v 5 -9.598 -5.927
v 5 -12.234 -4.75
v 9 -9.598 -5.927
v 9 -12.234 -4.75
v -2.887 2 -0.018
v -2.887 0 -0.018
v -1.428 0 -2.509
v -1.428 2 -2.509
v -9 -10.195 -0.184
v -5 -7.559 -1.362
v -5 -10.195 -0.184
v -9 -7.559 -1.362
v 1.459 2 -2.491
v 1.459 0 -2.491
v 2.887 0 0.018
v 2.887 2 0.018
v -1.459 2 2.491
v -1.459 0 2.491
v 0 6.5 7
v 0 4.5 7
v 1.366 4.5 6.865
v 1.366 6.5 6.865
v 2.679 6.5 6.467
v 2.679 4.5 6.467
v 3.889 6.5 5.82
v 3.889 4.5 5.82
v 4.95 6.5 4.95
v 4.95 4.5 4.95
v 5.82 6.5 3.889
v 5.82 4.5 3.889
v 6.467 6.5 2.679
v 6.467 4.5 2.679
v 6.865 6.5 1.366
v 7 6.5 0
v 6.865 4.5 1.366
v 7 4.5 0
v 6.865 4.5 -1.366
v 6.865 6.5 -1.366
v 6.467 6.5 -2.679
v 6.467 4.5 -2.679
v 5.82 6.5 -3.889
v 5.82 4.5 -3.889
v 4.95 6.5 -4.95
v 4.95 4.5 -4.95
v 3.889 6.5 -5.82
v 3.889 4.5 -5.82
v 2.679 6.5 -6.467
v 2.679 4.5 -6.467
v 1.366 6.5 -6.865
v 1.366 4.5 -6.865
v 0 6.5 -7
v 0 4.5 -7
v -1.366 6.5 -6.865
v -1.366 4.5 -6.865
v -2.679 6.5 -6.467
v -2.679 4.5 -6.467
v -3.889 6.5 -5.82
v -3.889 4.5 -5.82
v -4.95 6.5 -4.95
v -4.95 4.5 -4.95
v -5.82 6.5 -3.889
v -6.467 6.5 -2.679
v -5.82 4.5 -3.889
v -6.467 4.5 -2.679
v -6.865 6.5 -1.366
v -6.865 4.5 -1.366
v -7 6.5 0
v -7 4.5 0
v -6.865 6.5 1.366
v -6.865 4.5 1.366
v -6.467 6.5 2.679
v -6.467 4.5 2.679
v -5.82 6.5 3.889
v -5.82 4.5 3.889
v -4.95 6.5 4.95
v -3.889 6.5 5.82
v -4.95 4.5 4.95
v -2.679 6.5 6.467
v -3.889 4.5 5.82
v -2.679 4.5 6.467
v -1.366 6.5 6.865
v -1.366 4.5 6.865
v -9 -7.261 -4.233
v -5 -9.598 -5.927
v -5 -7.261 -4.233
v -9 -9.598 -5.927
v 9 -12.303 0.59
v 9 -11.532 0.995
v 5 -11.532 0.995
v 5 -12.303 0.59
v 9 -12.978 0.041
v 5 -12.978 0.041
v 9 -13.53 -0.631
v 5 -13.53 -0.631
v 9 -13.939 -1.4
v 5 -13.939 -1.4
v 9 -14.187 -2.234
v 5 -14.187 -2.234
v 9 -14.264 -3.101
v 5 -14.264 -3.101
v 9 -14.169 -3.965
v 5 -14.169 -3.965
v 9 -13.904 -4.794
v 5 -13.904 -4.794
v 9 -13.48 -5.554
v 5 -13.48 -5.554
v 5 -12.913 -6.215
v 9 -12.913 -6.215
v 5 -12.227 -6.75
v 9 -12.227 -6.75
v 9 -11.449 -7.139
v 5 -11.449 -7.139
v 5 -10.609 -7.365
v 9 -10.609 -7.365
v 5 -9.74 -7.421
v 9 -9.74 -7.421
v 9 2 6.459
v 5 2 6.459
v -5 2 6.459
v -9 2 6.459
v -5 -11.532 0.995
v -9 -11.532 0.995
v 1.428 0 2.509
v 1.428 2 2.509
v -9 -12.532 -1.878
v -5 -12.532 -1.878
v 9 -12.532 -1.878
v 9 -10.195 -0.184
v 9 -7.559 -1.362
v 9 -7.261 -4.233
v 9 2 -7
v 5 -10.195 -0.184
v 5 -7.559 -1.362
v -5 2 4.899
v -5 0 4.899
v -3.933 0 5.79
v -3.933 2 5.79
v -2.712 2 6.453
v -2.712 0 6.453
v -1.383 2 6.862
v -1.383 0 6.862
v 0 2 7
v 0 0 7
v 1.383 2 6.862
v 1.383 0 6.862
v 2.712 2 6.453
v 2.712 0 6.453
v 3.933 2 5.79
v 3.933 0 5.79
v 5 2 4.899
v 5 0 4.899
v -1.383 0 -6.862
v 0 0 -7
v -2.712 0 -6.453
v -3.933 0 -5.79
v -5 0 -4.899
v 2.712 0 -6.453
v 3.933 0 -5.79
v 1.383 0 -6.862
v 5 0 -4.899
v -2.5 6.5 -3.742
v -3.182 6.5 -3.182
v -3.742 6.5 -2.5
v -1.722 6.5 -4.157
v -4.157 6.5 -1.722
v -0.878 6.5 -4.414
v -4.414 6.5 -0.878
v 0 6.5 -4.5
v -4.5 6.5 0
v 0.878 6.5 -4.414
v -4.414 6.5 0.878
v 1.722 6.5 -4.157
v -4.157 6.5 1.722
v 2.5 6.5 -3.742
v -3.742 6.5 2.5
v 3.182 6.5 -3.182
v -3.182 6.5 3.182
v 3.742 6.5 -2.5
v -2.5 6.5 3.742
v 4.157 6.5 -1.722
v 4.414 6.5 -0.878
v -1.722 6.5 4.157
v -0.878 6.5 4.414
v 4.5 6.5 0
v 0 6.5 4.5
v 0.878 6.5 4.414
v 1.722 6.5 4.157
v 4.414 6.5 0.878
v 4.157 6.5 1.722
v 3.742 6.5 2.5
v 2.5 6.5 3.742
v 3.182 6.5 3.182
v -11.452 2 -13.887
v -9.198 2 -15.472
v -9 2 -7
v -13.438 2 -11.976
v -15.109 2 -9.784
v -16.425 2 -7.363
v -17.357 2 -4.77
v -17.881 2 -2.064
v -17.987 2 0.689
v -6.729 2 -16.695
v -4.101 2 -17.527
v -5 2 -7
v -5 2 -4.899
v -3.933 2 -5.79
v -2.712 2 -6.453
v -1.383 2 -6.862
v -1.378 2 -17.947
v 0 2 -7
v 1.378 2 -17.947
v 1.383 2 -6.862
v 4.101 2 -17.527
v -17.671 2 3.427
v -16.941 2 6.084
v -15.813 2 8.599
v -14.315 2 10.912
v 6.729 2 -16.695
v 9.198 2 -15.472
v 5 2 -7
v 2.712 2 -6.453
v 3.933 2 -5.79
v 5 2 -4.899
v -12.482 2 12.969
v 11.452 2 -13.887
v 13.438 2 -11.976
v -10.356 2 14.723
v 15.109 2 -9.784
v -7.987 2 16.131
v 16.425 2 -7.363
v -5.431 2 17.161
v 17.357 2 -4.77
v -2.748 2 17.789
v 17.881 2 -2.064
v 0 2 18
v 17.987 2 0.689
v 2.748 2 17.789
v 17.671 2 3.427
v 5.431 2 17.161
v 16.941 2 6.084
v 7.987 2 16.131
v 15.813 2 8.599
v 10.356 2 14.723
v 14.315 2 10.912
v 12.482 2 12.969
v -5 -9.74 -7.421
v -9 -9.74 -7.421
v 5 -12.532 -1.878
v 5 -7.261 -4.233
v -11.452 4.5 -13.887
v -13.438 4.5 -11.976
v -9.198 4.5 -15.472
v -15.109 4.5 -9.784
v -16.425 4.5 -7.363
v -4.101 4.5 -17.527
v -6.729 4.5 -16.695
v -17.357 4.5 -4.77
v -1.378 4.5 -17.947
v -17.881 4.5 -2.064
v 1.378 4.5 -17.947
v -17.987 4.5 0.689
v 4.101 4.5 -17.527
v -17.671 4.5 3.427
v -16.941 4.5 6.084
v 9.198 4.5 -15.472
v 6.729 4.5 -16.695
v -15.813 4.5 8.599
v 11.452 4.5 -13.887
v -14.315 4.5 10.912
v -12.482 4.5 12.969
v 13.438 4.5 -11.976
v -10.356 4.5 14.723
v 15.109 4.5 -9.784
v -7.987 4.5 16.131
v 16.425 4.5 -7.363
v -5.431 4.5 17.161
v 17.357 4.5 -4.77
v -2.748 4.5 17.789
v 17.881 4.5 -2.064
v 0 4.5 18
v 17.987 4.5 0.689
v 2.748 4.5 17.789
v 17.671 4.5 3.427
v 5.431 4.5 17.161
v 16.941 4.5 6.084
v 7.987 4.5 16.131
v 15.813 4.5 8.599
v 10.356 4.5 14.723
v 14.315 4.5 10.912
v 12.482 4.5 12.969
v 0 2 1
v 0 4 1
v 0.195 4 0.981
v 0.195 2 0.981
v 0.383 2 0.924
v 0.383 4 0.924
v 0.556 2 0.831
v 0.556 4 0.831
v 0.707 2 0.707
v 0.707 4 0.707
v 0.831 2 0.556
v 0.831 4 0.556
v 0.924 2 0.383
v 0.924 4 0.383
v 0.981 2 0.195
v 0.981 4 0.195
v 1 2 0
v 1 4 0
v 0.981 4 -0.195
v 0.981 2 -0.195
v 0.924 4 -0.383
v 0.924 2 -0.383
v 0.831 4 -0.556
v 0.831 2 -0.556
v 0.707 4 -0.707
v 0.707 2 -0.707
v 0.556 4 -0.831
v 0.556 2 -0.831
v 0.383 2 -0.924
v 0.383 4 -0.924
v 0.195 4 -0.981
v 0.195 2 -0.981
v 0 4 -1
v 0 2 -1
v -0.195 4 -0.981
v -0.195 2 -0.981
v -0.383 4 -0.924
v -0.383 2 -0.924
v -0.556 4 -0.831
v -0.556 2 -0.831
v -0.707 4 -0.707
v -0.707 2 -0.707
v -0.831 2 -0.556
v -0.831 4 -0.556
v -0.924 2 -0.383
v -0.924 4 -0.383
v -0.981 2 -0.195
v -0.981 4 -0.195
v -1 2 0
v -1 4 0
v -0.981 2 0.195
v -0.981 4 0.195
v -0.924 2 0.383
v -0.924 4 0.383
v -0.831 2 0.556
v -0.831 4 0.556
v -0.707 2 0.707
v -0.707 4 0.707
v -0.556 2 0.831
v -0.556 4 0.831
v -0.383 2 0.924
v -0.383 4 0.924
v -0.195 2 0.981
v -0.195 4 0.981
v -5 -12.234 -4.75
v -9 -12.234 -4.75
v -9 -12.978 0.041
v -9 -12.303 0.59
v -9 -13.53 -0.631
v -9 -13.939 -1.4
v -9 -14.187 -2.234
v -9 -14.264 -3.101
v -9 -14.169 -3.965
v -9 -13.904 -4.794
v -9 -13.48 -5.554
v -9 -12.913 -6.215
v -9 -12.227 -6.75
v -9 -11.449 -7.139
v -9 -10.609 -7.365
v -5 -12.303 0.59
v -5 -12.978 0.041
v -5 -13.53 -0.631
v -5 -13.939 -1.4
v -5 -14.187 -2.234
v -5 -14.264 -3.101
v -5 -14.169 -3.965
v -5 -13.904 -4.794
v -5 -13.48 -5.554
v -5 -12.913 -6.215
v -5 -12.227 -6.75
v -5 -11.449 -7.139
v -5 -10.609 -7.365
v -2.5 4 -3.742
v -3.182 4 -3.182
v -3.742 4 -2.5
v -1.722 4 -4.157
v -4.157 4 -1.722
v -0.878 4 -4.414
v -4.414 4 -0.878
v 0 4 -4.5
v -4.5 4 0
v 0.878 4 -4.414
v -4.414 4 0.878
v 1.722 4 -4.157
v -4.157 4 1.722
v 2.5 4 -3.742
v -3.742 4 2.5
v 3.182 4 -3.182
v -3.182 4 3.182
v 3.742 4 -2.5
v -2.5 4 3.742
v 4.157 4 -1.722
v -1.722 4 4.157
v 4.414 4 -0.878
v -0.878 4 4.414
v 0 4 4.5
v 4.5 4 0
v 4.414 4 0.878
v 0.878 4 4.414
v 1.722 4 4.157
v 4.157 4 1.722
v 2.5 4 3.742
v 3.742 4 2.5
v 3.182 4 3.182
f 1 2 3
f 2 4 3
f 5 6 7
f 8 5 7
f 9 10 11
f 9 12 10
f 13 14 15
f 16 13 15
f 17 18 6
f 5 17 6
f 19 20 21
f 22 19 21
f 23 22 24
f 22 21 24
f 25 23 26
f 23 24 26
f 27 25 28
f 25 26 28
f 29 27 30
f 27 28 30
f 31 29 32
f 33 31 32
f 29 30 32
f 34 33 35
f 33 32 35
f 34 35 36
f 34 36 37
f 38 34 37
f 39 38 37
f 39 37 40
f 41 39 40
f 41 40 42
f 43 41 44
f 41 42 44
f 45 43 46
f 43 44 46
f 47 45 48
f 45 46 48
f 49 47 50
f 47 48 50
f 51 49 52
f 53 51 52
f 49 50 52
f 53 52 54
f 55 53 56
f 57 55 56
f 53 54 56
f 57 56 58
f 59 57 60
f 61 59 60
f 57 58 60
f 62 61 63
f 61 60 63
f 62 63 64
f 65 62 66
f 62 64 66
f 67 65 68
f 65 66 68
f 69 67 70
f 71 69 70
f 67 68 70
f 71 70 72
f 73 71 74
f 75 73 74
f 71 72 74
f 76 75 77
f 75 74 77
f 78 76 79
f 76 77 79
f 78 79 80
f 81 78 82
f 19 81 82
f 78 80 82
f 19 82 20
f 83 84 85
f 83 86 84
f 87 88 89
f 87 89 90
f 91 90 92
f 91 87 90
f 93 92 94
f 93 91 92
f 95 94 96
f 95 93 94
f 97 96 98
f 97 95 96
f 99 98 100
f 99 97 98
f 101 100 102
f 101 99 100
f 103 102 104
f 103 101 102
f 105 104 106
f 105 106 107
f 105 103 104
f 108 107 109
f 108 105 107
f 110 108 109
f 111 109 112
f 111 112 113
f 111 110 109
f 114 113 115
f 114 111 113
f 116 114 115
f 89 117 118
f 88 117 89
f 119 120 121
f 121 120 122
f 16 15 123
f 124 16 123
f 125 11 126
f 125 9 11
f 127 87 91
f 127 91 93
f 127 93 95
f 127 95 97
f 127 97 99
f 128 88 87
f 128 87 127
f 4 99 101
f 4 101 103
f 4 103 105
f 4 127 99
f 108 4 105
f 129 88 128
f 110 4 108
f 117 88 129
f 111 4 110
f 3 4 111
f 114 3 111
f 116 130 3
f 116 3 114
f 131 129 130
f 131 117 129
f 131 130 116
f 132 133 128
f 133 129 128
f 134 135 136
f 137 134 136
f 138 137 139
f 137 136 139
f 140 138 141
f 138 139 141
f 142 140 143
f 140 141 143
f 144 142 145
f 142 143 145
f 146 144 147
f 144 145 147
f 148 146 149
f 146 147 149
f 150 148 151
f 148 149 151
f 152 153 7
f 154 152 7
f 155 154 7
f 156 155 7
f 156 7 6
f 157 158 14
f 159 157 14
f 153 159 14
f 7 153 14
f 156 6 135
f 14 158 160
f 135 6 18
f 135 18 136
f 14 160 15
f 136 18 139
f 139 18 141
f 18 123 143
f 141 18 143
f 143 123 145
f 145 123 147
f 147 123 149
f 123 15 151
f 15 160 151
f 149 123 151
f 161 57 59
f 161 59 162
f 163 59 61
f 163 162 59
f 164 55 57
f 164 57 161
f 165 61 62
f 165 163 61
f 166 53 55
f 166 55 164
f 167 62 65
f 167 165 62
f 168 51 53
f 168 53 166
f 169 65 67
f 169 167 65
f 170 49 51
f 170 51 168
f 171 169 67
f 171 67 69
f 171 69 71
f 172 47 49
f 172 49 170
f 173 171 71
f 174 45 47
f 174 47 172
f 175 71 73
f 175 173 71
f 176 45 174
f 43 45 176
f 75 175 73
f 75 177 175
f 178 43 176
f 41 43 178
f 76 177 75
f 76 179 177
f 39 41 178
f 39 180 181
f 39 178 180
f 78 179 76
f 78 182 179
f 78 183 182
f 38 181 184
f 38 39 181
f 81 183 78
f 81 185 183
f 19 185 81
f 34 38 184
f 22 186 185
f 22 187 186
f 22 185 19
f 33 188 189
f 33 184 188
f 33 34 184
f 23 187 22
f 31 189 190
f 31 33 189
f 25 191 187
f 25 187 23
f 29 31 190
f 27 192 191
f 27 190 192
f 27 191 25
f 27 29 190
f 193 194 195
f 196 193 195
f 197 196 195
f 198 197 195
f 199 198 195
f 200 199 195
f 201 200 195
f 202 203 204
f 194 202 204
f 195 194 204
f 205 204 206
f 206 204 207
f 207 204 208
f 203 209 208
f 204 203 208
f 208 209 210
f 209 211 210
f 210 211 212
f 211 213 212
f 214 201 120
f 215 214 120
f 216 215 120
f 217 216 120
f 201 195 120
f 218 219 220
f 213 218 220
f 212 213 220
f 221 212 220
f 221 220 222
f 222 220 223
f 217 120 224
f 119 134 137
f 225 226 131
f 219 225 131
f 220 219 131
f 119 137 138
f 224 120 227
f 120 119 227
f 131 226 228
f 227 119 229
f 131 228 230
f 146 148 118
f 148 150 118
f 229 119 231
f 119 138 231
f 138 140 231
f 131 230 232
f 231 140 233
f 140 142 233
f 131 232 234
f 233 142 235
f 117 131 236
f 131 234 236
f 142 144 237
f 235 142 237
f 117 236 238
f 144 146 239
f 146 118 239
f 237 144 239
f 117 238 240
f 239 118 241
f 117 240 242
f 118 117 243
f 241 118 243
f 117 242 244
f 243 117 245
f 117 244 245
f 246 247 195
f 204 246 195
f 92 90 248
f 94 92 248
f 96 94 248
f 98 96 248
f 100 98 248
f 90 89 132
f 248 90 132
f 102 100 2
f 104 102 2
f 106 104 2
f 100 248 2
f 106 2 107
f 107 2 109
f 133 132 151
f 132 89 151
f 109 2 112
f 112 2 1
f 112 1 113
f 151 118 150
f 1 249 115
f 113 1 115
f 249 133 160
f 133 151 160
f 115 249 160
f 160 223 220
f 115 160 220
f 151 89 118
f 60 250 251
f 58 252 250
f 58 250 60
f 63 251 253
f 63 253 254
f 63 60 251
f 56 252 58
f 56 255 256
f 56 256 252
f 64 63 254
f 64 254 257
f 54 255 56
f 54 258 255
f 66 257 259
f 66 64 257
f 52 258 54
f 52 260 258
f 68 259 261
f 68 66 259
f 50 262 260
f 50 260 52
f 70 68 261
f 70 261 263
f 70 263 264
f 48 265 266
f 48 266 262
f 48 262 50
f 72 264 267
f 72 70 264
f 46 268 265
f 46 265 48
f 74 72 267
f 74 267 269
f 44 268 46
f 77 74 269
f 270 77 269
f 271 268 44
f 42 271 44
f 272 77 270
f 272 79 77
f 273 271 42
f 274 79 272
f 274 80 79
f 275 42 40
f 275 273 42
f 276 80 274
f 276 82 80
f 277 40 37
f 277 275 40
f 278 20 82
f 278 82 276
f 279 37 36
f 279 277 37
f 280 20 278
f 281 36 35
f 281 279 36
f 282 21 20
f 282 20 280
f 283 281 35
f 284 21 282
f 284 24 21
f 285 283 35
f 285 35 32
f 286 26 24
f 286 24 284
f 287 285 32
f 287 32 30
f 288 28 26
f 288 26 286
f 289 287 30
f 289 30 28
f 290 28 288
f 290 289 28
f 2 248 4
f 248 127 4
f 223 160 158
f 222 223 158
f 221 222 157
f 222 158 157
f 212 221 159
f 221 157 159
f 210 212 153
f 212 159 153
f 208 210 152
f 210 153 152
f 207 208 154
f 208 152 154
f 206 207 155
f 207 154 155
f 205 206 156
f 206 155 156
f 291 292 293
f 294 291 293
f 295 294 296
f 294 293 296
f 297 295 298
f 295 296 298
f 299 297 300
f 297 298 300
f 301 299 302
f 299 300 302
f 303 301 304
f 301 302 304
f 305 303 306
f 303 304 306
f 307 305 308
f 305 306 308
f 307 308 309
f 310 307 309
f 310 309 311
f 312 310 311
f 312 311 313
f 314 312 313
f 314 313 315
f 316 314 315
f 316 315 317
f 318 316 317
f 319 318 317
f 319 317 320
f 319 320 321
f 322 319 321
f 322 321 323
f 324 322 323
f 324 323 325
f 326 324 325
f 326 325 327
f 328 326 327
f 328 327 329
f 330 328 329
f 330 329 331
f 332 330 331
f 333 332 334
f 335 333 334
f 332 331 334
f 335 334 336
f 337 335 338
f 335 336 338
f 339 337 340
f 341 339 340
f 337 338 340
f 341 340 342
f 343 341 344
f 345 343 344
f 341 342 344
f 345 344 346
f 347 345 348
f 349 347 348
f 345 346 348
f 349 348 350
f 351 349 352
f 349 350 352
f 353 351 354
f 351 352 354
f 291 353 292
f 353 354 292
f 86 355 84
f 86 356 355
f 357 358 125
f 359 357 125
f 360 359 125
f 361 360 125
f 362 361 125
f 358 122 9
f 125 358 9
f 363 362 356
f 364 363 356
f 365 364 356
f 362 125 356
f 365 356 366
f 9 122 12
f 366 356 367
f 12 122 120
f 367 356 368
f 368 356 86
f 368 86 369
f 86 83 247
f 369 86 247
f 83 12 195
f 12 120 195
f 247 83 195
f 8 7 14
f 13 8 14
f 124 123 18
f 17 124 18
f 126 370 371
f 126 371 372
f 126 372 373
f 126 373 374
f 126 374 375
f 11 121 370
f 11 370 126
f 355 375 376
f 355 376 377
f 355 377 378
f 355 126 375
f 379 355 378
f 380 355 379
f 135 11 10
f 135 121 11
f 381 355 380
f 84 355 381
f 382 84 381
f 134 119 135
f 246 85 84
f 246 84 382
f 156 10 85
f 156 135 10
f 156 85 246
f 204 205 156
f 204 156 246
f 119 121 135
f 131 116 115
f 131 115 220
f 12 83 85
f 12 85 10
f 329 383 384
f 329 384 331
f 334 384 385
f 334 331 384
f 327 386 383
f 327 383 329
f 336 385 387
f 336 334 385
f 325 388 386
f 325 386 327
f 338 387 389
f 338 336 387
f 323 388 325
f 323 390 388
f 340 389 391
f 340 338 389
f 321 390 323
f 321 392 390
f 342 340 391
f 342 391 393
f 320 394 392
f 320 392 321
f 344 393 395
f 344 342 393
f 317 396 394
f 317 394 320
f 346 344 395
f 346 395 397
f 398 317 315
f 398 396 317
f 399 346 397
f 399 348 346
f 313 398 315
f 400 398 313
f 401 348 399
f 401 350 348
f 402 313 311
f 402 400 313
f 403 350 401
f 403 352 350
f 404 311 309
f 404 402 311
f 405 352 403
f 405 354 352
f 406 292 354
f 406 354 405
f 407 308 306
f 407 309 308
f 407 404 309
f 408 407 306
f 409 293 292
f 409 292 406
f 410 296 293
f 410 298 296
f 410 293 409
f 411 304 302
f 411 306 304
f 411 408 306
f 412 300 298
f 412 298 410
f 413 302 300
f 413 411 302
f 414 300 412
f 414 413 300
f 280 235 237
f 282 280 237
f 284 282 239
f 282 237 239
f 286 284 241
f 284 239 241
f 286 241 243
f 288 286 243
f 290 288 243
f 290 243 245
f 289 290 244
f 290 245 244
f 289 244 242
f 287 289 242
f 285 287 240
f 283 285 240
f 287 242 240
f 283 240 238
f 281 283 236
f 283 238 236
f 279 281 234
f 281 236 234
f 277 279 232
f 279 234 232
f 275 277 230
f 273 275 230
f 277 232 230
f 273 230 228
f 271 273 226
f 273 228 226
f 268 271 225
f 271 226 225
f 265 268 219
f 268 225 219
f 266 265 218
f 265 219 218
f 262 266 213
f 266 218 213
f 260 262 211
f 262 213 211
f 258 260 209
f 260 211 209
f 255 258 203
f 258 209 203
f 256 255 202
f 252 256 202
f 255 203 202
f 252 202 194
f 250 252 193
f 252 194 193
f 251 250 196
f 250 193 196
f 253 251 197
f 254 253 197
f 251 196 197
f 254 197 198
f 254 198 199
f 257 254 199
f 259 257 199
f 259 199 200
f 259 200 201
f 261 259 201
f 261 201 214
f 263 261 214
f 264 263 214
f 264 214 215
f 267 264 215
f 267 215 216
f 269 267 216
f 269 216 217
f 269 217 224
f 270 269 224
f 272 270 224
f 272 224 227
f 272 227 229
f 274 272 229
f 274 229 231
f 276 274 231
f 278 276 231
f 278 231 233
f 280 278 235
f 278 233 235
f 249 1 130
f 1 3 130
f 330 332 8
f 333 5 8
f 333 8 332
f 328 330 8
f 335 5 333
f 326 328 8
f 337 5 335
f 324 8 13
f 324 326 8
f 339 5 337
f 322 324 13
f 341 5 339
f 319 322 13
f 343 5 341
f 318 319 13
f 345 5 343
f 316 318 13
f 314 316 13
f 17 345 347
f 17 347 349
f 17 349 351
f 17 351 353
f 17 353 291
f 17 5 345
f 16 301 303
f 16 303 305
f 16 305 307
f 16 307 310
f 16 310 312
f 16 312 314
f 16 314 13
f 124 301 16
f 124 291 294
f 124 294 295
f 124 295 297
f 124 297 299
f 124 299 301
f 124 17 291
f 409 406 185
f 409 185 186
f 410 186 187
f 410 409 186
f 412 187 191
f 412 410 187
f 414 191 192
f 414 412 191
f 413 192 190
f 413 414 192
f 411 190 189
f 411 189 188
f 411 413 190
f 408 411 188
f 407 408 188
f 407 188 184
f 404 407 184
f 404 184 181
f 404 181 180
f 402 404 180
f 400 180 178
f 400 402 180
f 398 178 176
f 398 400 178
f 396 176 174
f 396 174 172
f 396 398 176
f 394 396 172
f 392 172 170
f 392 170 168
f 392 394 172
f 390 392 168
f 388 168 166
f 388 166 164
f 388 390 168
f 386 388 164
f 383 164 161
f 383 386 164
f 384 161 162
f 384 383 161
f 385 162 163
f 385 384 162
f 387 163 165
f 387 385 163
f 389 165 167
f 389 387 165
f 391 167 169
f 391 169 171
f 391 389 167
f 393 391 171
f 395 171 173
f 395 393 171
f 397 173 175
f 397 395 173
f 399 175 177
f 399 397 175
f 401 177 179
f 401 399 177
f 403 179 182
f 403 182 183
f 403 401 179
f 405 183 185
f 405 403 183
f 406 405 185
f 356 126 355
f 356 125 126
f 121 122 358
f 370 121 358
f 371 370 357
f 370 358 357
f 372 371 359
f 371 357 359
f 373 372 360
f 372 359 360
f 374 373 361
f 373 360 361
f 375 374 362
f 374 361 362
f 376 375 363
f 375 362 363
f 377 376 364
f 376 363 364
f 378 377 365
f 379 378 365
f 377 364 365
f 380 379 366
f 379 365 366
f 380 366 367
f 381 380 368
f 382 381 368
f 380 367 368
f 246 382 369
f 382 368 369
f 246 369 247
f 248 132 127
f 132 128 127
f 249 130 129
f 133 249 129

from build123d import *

# Parameters (mm, degrees)
SKETCH_1_R          = 7
EXTRUDE_1_DEPTH     = 4
SKETCH_2_R          = 7
SKETCH_2_R_2        = 4.5
EXTRUDE_2_DEPTH     = 2.5
SKETCH_3_R          = 1
CUT_EXTRUDE_1_DEPTH = 2.5
CUT_EXTRUDE_2_DEPTH = 2
SKETCH_5_R          = 18
SKETCH_5_R_2        = 7
EXTRUDE_3_DEPTH     = 2.5
EXTRUDE_4_DEPTH     = 2


with BuildPart() as part:
    # 草图1 → 凸台-拉伸1 (new body)
    with BuildSketch(Plane(origin=(0, 0, 0), x_dir=(1, 0, 0), z_dir=(0, 1, 0))):
        with Locations(Location((0, 0, 0), (0, 0, 270))):
            Circle(SKETCH_1_R)
    extrude(amount=EXTRUDE_1_DEPTH)

    # 草图2 → 凸台-拉伸2 (add)
    with BuildSketch(Plane(origin=(0, 4, 0), x_dir=(1, 0, 0), z_dir=(0, 1, 0))):
        with Locations(Location((0, 0, 0), (0, 0, 270))):
            Circle(SKETCH_2_R)
        with Locations(Location((0, 0, 0), (0, 0, 270))):
            Circle(SKETCH_2_R_2, mode=Mode.SUBTRACT)
    extrude(amount=EXTRUDE_2_DEPTH)

    # 草图3 → 切除-拉伸1 (cut)
    with BuildSketch(Plane(origin=(0, 4, 0), x_dir=(1, 0, 0), z_dir=(0, 1, 0))):
        with Locations(Location((0, 0, 0), (0, 0, 270))):
            Circle(SKETCH_3_R)
    extrude(amount=-CUT_EXTRUDE_1_DEPTH, mode=Mode.SUBTRACT)

    # 草图4 → 切除-拉伸2 (cut)
    with BuildSketch(Plane.XZ):
        Polygon((1.459083967, -2.490864772), (2.886694153, 0.018171396), (1.427610186, 2.509036167), (-1.459083967, 2.490864772), (-2.886694153, -0.018171396), (-1.427610186, -2.509036167), align=None)
    extrude(amount=-CUT_EXTRUDE_2_DEPTH, mode=Mode.SUBTRACT)

    # 草图5 → 凸台-拉伸3 (add)
    with BuildSketch(Plane(origin=(0, 2, 0), x_dir=(1, 0, 0), z_dir=(0, 1, 0))):
        with Locations(Location((0, 0, 0), (0, 0, 270))):
            Circle(SKETCH_5_R)
        with Locations(Location((0, 0, 0), (0, 0, 270))):
            Circle(SKETCH_5_R_2, mode=Mode.SUBTRACT)
    extrude(amount=EXTRUDE_3_DEPTH)

    # 草图6 → 凸台-拉伸4 (add, symmetric)
    with BuildSketch(Plane(origin=(7, 0, 0), x_dir=(0, 0, -1), z_dir=(1, 0, 0))):
        with BuildLine():
            Line((-6.459228818, 2), (-0.994639994, -11.532205447))
            ThreePointArc((-0.994639994, -11.532205447), (3.965427991, -14.168883056), (7.420905758, -9.740111597))
            Line((7.420905758, -9.740111597), (7, 2))
            Line((7, 2), (-6.459228818, 2))
        make_face()
        Polygon((4.232968046, -7.260851368), (1.361669462, -7.559142793), (0.184348122, -10.194906021), (1.878325366, -12.532377824), (4.74962395, -12.234086399), (5.92694529, -9.598323171), align=None, mode=Mode.SUBTRACT)
    extrude_4 = extrude(amount=EXTRUDE_4_DEPTH, both=True)

    # 镜向1: 凸台-拉伸4 across plane
    add(extrude_4.mirror(Plane(origin=(0, 0, 0), x_dir=(0, 0, 1), z_dir=(1, 0, 0))))


solid = part.part
